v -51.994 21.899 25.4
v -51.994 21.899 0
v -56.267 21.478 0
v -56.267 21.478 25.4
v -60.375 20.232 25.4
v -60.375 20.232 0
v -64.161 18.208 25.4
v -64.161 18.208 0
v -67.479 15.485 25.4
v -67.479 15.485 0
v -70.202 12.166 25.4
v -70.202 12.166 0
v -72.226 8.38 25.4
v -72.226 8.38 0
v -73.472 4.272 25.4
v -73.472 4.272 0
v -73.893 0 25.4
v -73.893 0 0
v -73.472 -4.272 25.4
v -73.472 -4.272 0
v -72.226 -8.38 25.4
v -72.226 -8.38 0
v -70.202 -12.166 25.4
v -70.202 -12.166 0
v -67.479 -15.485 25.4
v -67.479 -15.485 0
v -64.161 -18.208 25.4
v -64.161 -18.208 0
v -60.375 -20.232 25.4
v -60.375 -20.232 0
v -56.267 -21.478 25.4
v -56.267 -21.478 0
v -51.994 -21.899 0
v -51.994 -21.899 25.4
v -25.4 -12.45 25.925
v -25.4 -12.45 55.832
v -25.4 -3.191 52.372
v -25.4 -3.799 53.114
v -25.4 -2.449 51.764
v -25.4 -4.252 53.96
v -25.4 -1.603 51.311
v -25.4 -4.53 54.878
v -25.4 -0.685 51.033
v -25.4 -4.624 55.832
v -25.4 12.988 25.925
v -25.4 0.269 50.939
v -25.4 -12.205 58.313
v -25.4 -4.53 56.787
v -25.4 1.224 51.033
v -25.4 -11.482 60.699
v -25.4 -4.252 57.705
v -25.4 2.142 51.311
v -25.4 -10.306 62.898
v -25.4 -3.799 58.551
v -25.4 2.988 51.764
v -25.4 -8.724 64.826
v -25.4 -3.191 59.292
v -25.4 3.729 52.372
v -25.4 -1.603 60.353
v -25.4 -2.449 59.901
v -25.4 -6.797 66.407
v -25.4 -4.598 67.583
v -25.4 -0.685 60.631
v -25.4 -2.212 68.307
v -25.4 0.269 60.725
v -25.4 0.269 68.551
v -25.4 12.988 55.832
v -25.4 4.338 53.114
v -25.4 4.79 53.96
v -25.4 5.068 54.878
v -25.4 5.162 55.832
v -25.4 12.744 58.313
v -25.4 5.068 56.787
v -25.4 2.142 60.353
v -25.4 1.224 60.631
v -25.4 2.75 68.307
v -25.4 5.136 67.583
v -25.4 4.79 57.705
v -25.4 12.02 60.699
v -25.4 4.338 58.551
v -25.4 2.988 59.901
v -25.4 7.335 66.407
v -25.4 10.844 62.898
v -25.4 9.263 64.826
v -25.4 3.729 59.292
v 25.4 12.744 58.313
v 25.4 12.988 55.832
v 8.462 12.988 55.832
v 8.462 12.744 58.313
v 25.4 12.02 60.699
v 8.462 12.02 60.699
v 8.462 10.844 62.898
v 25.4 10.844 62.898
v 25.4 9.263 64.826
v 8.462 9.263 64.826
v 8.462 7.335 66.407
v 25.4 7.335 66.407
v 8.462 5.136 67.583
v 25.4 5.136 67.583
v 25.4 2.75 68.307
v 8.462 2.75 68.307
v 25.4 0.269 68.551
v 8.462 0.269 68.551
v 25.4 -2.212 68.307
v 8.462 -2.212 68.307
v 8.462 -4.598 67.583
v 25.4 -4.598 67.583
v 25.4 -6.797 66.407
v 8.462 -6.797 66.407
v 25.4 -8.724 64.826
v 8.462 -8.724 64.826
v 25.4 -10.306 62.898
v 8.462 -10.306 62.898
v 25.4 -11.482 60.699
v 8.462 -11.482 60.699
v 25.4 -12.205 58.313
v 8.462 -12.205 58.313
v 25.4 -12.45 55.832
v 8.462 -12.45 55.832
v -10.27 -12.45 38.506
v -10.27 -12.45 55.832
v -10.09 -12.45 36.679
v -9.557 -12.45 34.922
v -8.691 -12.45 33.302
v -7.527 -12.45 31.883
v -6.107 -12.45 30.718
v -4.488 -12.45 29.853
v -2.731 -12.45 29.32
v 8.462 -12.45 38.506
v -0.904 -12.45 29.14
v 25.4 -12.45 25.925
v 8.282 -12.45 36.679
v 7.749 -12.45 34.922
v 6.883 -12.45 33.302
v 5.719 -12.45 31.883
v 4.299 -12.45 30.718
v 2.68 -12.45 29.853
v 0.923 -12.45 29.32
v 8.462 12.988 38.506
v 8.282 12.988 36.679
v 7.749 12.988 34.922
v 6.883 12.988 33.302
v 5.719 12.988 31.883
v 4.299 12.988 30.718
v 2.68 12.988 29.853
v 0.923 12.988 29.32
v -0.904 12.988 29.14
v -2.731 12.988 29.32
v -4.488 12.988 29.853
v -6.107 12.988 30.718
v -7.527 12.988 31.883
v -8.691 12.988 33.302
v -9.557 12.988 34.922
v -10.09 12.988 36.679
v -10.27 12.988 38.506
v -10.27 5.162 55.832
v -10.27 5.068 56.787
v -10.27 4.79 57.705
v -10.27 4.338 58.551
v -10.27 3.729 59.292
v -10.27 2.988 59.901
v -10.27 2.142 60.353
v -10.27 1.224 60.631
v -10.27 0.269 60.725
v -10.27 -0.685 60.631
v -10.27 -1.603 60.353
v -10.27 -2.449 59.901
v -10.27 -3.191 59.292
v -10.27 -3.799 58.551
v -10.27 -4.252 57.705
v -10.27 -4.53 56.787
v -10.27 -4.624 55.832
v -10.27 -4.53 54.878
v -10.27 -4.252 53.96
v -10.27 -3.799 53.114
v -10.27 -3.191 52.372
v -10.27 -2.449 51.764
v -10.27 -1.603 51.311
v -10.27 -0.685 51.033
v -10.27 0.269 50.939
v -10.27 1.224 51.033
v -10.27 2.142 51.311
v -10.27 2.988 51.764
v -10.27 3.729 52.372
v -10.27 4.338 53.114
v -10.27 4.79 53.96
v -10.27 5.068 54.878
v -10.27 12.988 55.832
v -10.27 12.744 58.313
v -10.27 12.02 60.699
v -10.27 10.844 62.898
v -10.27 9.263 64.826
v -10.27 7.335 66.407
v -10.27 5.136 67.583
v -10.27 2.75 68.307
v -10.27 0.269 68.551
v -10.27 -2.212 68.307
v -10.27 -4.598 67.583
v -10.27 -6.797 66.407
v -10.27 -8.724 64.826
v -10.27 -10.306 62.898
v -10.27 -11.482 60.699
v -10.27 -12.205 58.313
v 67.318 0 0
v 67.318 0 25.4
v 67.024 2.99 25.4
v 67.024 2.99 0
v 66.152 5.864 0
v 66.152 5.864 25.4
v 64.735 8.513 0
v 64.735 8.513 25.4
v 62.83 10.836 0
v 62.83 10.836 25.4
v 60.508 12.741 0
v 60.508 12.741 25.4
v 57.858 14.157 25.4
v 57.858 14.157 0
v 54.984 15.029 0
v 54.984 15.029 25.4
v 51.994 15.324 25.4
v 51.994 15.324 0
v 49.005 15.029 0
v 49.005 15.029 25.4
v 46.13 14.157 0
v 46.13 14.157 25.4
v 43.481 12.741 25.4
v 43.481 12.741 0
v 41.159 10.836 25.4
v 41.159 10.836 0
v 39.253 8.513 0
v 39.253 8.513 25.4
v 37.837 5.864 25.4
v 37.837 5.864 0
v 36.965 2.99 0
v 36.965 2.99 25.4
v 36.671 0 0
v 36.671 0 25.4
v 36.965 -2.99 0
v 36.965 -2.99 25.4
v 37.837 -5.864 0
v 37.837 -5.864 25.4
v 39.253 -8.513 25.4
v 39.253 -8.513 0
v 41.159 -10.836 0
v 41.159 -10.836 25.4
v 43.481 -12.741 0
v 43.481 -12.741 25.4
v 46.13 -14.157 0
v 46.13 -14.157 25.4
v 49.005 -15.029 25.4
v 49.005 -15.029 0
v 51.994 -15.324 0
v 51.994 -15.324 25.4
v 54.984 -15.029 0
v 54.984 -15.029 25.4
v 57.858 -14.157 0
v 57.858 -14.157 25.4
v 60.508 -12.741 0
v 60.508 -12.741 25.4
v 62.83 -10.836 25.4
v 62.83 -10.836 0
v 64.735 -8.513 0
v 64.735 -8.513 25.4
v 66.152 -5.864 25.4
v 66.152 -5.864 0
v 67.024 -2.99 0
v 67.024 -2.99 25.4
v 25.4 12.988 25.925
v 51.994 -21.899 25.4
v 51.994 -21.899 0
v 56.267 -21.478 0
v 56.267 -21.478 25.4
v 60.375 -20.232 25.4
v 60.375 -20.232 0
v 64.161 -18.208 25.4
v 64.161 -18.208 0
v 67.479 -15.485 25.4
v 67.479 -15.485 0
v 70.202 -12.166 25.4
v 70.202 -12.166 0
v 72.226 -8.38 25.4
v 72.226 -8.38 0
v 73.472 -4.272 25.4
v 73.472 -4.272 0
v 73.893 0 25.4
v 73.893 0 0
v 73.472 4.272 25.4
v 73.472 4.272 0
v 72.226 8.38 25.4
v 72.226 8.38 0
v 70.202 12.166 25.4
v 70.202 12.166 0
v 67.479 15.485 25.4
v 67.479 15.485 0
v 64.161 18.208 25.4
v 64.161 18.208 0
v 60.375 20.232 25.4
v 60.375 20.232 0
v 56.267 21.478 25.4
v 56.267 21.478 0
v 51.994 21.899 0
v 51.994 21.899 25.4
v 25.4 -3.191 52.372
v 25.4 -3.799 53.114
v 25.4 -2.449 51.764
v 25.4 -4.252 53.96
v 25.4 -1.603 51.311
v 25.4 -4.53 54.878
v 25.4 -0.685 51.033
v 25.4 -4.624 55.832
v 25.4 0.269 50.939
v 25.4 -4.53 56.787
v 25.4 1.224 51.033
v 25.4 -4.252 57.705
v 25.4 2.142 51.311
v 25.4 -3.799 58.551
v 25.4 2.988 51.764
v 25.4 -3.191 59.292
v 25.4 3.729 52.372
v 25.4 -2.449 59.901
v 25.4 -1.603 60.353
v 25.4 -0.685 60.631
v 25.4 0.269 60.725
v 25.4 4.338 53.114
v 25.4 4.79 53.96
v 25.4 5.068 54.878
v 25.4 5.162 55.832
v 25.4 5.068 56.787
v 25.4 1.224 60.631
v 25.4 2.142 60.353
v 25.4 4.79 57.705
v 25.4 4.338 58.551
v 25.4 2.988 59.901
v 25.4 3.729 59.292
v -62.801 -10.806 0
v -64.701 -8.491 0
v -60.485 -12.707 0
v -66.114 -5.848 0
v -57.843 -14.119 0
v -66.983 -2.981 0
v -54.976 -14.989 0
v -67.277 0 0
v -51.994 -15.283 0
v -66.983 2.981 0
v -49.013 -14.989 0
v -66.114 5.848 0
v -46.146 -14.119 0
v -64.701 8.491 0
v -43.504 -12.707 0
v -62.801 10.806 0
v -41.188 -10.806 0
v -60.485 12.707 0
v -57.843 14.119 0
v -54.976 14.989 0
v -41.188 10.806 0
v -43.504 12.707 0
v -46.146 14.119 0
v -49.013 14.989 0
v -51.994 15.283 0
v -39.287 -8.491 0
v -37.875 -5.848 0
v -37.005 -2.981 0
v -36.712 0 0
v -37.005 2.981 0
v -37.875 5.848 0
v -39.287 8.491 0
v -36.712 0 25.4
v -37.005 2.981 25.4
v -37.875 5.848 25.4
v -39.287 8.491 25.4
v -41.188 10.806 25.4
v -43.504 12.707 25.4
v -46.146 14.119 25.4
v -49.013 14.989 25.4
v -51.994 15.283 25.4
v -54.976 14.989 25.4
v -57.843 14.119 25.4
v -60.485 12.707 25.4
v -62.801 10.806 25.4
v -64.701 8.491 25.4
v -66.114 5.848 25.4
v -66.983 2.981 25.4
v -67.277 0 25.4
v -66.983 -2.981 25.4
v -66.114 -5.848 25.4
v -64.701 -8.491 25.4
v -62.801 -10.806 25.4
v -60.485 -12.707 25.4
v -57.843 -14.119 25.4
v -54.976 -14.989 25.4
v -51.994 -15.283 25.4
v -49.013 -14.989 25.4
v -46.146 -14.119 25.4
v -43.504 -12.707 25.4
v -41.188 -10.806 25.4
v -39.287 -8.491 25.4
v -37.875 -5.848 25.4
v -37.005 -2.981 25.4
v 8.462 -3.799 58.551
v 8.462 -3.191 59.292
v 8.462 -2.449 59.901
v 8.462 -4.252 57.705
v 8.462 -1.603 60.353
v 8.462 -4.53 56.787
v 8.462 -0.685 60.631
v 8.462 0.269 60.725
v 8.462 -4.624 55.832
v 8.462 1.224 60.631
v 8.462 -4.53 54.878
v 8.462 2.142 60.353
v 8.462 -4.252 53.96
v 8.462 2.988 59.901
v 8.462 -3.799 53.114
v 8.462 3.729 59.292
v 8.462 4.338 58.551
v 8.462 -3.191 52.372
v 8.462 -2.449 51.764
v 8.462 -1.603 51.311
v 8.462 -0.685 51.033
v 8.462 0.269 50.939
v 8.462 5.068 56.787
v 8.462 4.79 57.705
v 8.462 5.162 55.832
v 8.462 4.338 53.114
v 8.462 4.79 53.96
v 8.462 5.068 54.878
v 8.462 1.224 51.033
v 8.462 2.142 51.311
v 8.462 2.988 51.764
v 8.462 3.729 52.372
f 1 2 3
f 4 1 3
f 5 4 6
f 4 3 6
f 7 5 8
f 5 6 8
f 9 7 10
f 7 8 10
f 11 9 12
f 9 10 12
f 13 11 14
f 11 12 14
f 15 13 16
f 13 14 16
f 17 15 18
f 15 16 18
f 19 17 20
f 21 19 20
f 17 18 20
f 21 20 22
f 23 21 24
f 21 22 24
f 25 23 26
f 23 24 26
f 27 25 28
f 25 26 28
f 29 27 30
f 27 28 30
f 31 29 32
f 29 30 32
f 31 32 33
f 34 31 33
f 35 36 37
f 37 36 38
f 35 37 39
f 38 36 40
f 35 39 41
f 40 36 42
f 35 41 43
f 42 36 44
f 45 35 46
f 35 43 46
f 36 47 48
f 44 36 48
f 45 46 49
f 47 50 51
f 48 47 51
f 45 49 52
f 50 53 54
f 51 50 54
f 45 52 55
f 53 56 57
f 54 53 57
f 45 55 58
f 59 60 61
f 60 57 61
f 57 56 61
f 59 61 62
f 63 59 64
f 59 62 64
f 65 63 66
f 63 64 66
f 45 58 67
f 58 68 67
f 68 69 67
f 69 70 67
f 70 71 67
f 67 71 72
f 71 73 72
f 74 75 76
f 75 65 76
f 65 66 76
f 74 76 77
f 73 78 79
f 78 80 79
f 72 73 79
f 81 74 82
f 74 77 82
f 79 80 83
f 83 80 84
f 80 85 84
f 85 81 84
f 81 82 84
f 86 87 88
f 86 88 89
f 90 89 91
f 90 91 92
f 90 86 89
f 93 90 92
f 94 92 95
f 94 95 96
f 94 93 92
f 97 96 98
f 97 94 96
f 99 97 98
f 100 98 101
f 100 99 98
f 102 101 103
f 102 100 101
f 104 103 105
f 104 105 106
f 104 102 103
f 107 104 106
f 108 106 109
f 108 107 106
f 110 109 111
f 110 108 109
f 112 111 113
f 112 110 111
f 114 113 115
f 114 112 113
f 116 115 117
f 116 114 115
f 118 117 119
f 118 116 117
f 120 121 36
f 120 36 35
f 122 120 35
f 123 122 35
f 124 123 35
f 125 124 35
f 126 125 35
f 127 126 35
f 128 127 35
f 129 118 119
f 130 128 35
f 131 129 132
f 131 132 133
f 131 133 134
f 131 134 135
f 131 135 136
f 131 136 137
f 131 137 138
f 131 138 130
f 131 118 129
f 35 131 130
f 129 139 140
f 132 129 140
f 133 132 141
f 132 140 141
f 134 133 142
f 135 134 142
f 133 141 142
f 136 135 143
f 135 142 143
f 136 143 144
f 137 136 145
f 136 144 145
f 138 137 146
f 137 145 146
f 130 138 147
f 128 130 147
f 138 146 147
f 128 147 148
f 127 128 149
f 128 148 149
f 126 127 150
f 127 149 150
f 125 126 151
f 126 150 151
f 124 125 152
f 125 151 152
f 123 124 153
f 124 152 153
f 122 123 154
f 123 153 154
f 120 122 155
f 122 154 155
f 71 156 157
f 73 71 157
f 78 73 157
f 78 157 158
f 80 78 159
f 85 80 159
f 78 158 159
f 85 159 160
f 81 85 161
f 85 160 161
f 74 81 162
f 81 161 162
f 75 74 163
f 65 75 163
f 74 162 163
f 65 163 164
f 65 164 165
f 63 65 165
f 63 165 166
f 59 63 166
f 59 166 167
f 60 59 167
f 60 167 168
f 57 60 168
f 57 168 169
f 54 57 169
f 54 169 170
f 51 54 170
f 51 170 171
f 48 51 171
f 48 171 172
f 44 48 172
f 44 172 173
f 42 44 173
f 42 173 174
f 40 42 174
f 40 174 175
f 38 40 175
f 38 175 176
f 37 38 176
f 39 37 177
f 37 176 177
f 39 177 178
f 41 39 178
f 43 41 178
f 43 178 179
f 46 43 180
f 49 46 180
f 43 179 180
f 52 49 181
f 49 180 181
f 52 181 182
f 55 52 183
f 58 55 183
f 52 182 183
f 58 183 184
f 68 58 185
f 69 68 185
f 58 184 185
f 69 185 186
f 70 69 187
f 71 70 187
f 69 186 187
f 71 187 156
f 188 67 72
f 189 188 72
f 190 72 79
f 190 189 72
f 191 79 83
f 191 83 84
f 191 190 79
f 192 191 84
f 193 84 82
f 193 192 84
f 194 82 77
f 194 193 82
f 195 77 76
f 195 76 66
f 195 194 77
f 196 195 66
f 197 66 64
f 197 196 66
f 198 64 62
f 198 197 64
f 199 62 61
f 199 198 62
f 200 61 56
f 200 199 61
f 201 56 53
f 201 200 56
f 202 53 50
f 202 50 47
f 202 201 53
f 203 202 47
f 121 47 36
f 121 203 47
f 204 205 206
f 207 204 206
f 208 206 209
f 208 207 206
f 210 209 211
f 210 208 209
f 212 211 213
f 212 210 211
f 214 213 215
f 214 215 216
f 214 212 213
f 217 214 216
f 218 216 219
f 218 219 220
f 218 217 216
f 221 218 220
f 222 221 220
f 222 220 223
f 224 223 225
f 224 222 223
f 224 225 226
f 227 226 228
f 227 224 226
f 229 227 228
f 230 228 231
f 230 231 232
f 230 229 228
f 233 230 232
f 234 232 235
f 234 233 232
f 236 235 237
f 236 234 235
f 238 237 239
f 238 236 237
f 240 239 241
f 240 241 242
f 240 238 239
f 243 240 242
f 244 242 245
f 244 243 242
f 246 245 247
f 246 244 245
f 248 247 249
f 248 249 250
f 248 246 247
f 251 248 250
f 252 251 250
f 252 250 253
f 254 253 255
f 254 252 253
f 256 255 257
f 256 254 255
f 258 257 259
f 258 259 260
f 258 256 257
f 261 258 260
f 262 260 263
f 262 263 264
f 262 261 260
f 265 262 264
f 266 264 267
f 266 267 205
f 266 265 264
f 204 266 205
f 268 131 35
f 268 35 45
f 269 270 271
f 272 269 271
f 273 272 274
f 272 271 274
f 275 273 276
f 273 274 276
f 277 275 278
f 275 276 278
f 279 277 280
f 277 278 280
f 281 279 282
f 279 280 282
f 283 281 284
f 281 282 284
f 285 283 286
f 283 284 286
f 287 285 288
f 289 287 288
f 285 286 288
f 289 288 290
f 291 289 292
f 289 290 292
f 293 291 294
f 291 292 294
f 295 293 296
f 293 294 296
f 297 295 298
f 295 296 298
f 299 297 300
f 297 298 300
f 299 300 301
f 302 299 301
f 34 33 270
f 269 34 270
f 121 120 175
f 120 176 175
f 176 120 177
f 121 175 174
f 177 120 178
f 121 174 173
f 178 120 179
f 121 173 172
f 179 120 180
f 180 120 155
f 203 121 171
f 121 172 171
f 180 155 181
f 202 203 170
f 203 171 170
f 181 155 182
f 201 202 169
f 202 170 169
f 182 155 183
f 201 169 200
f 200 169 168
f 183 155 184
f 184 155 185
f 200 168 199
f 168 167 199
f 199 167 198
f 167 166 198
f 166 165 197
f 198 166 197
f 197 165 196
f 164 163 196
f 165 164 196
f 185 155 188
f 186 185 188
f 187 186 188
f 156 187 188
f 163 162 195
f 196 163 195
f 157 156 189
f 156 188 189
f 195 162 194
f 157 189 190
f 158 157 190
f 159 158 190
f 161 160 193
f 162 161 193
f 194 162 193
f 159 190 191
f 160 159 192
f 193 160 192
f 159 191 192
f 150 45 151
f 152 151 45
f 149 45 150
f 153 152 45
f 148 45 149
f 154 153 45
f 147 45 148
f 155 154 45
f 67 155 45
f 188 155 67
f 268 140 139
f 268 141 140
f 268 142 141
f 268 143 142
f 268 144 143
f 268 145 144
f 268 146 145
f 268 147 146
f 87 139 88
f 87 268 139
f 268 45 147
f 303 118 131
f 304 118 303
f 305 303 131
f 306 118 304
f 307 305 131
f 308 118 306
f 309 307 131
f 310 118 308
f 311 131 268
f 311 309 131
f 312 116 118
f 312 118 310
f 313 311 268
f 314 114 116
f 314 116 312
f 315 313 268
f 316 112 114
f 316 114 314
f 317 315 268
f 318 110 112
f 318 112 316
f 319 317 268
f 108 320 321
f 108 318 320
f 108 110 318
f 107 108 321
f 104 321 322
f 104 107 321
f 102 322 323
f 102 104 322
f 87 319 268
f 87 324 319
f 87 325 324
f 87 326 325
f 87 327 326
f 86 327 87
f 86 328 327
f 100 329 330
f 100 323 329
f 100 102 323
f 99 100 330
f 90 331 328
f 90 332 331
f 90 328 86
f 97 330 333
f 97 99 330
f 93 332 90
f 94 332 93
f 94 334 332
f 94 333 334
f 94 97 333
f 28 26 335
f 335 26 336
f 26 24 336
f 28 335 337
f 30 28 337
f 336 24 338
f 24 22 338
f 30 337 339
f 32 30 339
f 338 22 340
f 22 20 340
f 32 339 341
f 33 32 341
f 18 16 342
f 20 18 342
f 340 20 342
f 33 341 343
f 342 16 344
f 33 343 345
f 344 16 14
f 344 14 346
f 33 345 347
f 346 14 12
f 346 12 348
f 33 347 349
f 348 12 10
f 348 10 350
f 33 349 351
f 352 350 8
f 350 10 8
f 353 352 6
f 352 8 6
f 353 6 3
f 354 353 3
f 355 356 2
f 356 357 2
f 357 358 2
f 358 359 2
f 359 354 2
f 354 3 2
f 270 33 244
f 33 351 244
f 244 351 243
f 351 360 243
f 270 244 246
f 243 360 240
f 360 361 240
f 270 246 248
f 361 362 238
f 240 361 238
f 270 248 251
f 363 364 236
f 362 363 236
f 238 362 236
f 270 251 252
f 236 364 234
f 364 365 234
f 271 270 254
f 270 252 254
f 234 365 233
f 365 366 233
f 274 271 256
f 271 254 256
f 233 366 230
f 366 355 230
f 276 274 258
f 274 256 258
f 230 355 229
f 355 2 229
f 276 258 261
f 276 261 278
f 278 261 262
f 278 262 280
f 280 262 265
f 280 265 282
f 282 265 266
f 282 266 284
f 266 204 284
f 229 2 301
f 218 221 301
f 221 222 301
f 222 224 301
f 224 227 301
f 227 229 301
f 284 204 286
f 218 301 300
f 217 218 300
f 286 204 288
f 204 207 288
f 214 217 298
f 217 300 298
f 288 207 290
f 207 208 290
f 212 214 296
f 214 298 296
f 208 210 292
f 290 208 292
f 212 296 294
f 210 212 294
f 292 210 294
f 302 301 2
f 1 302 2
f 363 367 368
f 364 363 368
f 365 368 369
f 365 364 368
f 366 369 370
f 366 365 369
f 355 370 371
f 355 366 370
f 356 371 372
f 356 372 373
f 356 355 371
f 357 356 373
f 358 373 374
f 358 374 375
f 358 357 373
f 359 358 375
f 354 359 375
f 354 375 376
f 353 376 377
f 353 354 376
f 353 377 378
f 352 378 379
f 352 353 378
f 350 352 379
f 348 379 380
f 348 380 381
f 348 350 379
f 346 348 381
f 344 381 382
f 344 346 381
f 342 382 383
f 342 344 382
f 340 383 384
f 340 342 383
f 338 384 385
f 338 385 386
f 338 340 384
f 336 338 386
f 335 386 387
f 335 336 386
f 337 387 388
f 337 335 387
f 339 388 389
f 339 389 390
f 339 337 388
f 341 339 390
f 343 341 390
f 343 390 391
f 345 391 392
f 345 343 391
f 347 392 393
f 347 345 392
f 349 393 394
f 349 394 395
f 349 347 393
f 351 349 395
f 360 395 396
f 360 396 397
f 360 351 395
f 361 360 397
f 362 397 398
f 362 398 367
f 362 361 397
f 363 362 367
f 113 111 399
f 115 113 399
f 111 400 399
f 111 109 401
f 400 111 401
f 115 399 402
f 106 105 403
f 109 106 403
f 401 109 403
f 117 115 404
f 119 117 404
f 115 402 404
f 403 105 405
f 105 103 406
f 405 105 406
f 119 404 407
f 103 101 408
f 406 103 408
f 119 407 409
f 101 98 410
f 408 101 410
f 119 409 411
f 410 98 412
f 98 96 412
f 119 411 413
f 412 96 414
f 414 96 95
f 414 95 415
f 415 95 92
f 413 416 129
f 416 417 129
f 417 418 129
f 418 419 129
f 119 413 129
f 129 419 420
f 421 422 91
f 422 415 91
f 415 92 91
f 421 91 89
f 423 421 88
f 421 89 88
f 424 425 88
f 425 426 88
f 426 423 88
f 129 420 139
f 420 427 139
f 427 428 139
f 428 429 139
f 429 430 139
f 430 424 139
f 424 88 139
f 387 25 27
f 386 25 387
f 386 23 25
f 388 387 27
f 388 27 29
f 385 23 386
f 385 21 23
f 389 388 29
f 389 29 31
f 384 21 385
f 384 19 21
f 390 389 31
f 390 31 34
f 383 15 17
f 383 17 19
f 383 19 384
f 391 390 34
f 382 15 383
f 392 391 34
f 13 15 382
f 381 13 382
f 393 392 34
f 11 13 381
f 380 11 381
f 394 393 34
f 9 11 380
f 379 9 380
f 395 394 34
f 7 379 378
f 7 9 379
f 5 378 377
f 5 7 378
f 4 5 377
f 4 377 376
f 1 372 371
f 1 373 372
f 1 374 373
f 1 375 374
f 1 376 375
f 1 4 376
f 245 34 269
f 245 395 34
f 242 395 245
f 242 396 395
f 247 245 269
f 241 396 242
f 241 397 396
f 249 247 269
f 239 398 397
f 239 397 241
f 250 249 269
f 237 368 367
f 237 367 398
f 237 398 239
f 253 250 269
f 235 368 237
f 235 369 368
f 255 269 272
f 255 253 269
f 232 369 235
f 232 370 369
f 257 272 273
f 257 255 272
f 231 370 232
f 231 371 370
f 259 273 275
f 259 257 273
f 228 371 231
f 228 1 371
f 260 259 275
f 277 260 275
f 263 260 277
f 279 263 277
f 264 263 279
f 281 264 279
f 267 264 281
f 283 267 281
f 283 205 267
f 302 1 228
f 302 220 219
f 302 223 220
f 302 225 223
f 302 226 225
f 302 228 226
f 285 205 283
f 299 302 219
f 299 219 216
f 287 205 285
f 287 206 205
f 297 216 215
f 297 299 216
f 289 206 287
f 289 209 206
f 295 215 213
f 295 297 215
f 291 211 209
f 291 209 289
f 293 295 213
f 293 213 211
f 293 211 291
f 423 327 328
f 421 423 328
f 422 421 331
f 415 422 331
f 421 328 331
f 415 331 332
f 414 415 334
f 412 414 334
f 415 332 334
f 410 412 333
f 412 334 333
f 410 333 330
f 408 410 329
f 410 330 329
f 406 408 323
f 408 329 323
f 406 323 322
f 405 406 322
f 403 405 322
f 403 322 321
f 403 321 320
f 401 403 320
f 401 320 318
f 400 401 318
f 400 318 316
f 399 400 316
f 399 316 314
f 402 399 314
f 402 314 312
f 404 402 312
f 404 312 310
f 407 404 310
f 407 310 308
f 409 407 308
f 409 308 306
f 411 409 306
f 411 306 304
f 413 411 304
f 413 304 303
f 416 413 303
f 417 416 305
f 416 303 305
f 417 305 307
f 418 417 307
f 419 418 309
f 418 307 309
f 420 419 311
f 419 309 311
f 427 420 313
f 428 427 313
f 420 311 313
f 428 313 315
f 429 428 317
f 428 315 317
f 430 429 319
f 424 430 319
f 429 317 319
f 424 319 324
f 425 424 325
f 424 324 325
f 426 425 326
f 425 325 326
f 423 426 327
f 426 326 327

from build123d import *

# Parameters (mm, degrees)
F0_R     = 15.282642
F0_R_2   = 15.323719
F1_DEPTH = 25.4
F3_DEPTH = 25.4
F4_R     = 4.893214
F5_DEPTH = 50.8
F7_DEPTH = 50.8


with BuildPart() as f1:
    # F0 (on Top) → F1 (new body)
    with BuildSketch(Plane.XY):
        with BuildLine():
            ThreePointArc((51.994264, -21.898761), (73.893026, 0), (51.994264, 21.898761))
            Line((51.994264, 21.898761), (-51.994264, 21.898761))
            ThreePointArc((-51.994264, 21.898761), (-73.893026, 0), (-51.994264, -21.898761))
            Line((-51.994264, -21.898761), (51.994264, -21.898761))
        make_face()
        with Locations((-51.994264, 0)):
            Circle(F0_R, mode=Mode.SUBTRACT)
        with Locations((51.994264, 0)):
            Circle(F0_R_2, mode=Mode.SUBTRACT)
    extrude(amount=F1_DEPTH)


with BuildPart() as f3:
    # F2 (on Right) → F3 (new body, symmetric)
    with BuildSketch(Plane.YZ):
        with BuildLine():
            Line((-12.449689, 55.832159), (-12.449689, 25.924856))
            Line((-12.449689, 25.924856), (12.987981, 25.924856))
            Line((12.987981, 25.924856), (12.987981, 55.832159))
            ThreePointArc((12.987981, 55.832159), (0.269146, 68.550994), (-12.449689, 55.832159))
        make_face()
    extrude(amount=F3_DEPTH, both=True)

    # F4 (on face) → F5 (cut)
    with BuildSketch(Plane.YZ.offset(25.4)):
        with Locations((0.269146, 55.832159)):
            Circle(F4_R)
    extrude(amount=-F5_DEPTH, mode=Mode.SUBTRACT)

    # F6 (on face) → F7 (cut)
    with BuildSketch(Plane(origin=(0, 12.987981, 0), x_dir=(-1, 0, 0), z_dir=(0, 1, 0))):
        with BuildLine():
            Line((10.269875, 72.258279), (-8.461736, 72.258279))
            Line((-8.461736, 72.258279), (-8.461736, 38.505711))
            ThreePointArc((-8.461736, 38.505711), (0.904069, 29.139905), (10.269875, 38.505711))
            Line((10.269875, 38.505711), (10.269875, 72.258279))
        make_face()
    extrude(amount=-F7_DEPTH, mode=Mode.SUBTRACT)


solid = Compound([f1.part, f3.part])
